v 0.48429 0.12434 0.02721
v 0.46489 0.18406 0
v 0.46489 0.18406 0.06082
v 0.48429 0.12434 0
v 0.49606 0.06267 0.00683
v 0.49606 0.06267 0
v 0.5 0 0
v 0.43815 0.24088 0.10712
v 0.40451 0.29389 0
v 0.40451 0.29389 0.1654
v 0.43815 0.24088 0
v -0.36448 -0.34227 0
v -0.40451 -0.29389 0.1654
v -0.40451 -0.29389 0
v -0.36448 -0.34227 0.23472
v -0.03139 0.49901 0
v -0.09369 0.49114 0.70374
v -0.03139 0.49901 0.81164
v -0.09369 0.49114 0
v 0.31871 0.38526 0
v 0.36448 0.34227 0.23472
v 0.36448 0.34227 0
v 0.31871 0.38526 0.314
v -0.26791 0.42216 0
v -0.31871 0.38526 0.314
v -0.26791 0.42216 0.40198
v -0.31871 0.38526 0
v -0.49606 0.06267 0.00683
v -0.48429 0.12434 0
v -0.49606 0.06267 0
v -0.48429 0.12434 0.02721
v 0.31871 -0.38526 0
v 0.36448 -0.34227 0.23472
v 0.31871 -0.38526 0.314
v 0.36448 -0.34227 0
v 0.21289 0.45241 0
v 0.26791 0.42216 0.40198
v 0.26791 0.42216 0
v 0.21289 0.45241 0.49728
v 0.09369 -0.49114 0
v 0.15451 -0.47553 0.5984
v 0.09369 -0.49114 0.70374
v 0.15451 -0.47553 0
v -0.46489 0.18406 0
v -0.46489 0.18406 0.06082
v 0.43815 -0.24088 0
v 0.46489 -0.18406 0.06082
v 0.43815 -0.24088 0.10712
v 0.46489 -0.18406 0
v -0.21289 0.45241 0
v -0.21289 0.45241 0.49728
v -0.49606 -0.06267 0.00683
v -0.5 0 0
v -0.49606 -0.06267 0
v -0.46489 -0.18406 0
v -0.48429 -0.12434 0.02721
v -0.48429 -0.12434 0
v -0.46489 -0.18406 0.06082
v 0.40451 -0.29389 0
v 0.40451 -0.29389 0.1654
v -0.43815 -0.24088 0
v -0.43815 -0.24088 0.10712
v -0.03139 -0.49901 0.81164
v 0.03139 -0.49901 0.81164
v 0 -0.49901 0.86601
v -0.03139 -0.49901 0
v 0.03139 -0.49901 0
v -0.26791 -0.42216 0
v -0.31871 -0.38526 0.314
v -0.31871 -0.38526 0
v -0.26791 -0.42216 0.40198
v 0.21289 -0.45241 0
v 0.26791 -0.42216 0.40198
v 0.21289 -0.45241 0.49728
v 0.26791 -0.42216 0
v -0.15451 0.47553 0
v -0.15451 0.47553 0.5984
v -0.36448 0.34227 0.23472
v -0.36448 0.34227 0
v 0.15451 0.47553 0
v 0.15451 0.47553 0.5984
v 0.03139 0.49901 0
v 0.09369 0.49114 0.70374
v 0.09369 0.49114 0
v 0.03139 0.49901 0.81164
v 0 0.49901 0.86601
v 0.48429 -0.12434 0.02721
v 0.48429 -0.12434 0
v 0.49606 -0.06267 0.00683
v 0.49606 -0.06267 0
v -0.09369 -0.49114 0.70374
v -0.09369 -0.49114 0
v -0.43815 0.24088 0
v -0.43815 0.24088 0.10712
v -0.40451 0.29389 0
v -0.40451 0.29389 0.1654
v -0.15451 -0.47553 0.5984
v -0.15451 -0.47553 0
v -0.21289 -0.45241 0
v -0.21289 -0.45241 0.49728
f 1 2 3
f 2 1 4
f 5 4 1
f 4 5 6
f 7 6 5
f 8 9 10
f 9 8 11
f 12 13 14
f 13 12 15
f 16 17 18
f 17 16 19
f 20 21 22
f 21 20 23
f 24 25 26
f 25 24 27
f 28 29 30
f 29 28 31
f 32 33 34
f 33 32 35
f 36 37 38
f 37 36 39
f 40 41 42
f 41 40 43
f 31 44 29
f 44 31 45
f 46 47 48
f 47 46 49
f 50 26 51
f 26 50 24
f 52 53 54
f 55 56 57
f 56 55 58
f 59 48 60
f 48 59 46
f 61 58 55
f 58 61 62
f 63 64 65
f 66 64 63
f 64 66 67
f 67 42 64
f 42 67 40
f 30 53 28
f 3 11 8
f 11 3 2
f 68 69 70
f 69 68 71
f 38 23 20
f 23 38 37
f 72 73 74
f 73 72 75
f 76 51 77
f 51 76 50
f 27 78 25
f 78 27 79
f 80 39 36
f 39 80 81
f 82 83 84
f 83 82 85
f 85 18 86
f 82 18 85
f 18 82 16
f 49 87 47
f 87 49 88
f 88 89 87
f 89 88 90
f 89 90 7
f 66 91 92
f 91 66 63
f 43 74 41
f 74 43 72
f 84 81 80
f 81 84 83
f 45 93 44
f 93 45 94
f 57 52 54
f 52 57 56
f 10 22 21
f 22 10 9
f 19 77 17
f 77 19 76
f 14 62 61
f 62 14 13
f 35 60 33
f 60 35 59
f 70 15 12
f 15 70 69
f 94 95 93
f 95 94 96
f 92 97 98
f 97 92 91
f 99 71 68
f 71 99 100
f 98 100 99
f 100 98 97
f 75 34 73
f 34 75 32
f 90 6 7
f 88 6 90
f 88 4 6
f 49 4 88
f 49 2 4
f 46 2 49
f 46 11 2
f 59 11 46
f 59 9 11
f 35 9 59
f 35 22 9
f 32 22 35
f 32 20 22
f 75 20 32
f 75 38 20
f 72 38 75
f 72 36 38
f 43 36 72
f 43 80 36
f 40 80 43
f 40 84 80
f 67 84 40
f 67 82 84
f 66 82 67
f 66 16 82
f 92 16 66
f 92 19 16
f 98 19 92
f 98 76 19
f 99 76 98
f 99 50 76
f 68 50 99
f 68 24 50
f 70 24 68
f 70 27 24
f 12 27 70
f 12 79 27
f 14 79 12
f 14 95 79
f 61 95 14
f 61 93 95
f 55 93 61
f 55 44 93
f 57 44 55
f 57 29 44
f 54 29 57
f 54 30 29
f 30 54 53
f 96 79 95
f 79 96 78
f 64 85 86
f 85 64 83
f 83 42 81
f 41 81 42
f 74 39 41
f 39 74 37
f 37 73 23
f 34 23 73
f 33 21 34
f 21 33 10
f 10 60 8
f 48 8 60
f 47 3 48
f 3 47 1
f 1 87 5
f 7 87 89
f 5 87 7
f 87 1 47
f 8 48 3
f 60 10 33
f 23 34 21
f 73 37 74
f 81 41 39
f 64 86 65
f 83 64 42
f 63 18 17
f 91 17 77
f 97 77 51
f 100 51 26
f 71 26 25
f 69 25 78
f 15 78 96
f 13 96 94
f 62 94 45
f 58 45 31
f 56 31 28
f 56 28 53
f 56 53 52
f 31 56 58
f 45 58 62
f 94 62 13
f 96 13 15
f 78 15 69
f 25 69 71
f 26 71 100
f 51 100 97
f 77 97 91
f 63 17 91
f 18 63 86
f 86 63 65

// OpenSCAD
// file: equilateral_triangle.scad
module equilateral_triangle() {
	polygon(
		points = [[-0.5, 0], [0.5, 0], [0, sqrt(3) / 2]],
		paths = [[0, 1, 2]]
	);
}
// file: equilateral_wedge.scad
include <equilateral_triangle.scad>;

module equilateral_wedge() {
	translate([0, 0.5, 0]) {
		rotate([90, 0, 0]) {
			linear_extrude(height = 1) {
				equilateral_triangle();
			}
		}
	}
}
// file: equilateral_plug.scad
include <unit_cylinder.scad>;
include <equilateral_wedge.scad>;

module equilateral_plug() {
	intersection() {
		unit_cylinder();
		equilateral_wedge();
	}
}
// file: unit_cylinder.scad
module unit_cylinder() {
	cylinder(
		h = 1,
		r1 = 0.5,
		r2 = 0.5,
		$fn = 50
	);
}
// main file
include <unit_cylinder.scad>;
include <equilateral_plug.scad>;

%unit_cylinder();
equilateral_plug();
